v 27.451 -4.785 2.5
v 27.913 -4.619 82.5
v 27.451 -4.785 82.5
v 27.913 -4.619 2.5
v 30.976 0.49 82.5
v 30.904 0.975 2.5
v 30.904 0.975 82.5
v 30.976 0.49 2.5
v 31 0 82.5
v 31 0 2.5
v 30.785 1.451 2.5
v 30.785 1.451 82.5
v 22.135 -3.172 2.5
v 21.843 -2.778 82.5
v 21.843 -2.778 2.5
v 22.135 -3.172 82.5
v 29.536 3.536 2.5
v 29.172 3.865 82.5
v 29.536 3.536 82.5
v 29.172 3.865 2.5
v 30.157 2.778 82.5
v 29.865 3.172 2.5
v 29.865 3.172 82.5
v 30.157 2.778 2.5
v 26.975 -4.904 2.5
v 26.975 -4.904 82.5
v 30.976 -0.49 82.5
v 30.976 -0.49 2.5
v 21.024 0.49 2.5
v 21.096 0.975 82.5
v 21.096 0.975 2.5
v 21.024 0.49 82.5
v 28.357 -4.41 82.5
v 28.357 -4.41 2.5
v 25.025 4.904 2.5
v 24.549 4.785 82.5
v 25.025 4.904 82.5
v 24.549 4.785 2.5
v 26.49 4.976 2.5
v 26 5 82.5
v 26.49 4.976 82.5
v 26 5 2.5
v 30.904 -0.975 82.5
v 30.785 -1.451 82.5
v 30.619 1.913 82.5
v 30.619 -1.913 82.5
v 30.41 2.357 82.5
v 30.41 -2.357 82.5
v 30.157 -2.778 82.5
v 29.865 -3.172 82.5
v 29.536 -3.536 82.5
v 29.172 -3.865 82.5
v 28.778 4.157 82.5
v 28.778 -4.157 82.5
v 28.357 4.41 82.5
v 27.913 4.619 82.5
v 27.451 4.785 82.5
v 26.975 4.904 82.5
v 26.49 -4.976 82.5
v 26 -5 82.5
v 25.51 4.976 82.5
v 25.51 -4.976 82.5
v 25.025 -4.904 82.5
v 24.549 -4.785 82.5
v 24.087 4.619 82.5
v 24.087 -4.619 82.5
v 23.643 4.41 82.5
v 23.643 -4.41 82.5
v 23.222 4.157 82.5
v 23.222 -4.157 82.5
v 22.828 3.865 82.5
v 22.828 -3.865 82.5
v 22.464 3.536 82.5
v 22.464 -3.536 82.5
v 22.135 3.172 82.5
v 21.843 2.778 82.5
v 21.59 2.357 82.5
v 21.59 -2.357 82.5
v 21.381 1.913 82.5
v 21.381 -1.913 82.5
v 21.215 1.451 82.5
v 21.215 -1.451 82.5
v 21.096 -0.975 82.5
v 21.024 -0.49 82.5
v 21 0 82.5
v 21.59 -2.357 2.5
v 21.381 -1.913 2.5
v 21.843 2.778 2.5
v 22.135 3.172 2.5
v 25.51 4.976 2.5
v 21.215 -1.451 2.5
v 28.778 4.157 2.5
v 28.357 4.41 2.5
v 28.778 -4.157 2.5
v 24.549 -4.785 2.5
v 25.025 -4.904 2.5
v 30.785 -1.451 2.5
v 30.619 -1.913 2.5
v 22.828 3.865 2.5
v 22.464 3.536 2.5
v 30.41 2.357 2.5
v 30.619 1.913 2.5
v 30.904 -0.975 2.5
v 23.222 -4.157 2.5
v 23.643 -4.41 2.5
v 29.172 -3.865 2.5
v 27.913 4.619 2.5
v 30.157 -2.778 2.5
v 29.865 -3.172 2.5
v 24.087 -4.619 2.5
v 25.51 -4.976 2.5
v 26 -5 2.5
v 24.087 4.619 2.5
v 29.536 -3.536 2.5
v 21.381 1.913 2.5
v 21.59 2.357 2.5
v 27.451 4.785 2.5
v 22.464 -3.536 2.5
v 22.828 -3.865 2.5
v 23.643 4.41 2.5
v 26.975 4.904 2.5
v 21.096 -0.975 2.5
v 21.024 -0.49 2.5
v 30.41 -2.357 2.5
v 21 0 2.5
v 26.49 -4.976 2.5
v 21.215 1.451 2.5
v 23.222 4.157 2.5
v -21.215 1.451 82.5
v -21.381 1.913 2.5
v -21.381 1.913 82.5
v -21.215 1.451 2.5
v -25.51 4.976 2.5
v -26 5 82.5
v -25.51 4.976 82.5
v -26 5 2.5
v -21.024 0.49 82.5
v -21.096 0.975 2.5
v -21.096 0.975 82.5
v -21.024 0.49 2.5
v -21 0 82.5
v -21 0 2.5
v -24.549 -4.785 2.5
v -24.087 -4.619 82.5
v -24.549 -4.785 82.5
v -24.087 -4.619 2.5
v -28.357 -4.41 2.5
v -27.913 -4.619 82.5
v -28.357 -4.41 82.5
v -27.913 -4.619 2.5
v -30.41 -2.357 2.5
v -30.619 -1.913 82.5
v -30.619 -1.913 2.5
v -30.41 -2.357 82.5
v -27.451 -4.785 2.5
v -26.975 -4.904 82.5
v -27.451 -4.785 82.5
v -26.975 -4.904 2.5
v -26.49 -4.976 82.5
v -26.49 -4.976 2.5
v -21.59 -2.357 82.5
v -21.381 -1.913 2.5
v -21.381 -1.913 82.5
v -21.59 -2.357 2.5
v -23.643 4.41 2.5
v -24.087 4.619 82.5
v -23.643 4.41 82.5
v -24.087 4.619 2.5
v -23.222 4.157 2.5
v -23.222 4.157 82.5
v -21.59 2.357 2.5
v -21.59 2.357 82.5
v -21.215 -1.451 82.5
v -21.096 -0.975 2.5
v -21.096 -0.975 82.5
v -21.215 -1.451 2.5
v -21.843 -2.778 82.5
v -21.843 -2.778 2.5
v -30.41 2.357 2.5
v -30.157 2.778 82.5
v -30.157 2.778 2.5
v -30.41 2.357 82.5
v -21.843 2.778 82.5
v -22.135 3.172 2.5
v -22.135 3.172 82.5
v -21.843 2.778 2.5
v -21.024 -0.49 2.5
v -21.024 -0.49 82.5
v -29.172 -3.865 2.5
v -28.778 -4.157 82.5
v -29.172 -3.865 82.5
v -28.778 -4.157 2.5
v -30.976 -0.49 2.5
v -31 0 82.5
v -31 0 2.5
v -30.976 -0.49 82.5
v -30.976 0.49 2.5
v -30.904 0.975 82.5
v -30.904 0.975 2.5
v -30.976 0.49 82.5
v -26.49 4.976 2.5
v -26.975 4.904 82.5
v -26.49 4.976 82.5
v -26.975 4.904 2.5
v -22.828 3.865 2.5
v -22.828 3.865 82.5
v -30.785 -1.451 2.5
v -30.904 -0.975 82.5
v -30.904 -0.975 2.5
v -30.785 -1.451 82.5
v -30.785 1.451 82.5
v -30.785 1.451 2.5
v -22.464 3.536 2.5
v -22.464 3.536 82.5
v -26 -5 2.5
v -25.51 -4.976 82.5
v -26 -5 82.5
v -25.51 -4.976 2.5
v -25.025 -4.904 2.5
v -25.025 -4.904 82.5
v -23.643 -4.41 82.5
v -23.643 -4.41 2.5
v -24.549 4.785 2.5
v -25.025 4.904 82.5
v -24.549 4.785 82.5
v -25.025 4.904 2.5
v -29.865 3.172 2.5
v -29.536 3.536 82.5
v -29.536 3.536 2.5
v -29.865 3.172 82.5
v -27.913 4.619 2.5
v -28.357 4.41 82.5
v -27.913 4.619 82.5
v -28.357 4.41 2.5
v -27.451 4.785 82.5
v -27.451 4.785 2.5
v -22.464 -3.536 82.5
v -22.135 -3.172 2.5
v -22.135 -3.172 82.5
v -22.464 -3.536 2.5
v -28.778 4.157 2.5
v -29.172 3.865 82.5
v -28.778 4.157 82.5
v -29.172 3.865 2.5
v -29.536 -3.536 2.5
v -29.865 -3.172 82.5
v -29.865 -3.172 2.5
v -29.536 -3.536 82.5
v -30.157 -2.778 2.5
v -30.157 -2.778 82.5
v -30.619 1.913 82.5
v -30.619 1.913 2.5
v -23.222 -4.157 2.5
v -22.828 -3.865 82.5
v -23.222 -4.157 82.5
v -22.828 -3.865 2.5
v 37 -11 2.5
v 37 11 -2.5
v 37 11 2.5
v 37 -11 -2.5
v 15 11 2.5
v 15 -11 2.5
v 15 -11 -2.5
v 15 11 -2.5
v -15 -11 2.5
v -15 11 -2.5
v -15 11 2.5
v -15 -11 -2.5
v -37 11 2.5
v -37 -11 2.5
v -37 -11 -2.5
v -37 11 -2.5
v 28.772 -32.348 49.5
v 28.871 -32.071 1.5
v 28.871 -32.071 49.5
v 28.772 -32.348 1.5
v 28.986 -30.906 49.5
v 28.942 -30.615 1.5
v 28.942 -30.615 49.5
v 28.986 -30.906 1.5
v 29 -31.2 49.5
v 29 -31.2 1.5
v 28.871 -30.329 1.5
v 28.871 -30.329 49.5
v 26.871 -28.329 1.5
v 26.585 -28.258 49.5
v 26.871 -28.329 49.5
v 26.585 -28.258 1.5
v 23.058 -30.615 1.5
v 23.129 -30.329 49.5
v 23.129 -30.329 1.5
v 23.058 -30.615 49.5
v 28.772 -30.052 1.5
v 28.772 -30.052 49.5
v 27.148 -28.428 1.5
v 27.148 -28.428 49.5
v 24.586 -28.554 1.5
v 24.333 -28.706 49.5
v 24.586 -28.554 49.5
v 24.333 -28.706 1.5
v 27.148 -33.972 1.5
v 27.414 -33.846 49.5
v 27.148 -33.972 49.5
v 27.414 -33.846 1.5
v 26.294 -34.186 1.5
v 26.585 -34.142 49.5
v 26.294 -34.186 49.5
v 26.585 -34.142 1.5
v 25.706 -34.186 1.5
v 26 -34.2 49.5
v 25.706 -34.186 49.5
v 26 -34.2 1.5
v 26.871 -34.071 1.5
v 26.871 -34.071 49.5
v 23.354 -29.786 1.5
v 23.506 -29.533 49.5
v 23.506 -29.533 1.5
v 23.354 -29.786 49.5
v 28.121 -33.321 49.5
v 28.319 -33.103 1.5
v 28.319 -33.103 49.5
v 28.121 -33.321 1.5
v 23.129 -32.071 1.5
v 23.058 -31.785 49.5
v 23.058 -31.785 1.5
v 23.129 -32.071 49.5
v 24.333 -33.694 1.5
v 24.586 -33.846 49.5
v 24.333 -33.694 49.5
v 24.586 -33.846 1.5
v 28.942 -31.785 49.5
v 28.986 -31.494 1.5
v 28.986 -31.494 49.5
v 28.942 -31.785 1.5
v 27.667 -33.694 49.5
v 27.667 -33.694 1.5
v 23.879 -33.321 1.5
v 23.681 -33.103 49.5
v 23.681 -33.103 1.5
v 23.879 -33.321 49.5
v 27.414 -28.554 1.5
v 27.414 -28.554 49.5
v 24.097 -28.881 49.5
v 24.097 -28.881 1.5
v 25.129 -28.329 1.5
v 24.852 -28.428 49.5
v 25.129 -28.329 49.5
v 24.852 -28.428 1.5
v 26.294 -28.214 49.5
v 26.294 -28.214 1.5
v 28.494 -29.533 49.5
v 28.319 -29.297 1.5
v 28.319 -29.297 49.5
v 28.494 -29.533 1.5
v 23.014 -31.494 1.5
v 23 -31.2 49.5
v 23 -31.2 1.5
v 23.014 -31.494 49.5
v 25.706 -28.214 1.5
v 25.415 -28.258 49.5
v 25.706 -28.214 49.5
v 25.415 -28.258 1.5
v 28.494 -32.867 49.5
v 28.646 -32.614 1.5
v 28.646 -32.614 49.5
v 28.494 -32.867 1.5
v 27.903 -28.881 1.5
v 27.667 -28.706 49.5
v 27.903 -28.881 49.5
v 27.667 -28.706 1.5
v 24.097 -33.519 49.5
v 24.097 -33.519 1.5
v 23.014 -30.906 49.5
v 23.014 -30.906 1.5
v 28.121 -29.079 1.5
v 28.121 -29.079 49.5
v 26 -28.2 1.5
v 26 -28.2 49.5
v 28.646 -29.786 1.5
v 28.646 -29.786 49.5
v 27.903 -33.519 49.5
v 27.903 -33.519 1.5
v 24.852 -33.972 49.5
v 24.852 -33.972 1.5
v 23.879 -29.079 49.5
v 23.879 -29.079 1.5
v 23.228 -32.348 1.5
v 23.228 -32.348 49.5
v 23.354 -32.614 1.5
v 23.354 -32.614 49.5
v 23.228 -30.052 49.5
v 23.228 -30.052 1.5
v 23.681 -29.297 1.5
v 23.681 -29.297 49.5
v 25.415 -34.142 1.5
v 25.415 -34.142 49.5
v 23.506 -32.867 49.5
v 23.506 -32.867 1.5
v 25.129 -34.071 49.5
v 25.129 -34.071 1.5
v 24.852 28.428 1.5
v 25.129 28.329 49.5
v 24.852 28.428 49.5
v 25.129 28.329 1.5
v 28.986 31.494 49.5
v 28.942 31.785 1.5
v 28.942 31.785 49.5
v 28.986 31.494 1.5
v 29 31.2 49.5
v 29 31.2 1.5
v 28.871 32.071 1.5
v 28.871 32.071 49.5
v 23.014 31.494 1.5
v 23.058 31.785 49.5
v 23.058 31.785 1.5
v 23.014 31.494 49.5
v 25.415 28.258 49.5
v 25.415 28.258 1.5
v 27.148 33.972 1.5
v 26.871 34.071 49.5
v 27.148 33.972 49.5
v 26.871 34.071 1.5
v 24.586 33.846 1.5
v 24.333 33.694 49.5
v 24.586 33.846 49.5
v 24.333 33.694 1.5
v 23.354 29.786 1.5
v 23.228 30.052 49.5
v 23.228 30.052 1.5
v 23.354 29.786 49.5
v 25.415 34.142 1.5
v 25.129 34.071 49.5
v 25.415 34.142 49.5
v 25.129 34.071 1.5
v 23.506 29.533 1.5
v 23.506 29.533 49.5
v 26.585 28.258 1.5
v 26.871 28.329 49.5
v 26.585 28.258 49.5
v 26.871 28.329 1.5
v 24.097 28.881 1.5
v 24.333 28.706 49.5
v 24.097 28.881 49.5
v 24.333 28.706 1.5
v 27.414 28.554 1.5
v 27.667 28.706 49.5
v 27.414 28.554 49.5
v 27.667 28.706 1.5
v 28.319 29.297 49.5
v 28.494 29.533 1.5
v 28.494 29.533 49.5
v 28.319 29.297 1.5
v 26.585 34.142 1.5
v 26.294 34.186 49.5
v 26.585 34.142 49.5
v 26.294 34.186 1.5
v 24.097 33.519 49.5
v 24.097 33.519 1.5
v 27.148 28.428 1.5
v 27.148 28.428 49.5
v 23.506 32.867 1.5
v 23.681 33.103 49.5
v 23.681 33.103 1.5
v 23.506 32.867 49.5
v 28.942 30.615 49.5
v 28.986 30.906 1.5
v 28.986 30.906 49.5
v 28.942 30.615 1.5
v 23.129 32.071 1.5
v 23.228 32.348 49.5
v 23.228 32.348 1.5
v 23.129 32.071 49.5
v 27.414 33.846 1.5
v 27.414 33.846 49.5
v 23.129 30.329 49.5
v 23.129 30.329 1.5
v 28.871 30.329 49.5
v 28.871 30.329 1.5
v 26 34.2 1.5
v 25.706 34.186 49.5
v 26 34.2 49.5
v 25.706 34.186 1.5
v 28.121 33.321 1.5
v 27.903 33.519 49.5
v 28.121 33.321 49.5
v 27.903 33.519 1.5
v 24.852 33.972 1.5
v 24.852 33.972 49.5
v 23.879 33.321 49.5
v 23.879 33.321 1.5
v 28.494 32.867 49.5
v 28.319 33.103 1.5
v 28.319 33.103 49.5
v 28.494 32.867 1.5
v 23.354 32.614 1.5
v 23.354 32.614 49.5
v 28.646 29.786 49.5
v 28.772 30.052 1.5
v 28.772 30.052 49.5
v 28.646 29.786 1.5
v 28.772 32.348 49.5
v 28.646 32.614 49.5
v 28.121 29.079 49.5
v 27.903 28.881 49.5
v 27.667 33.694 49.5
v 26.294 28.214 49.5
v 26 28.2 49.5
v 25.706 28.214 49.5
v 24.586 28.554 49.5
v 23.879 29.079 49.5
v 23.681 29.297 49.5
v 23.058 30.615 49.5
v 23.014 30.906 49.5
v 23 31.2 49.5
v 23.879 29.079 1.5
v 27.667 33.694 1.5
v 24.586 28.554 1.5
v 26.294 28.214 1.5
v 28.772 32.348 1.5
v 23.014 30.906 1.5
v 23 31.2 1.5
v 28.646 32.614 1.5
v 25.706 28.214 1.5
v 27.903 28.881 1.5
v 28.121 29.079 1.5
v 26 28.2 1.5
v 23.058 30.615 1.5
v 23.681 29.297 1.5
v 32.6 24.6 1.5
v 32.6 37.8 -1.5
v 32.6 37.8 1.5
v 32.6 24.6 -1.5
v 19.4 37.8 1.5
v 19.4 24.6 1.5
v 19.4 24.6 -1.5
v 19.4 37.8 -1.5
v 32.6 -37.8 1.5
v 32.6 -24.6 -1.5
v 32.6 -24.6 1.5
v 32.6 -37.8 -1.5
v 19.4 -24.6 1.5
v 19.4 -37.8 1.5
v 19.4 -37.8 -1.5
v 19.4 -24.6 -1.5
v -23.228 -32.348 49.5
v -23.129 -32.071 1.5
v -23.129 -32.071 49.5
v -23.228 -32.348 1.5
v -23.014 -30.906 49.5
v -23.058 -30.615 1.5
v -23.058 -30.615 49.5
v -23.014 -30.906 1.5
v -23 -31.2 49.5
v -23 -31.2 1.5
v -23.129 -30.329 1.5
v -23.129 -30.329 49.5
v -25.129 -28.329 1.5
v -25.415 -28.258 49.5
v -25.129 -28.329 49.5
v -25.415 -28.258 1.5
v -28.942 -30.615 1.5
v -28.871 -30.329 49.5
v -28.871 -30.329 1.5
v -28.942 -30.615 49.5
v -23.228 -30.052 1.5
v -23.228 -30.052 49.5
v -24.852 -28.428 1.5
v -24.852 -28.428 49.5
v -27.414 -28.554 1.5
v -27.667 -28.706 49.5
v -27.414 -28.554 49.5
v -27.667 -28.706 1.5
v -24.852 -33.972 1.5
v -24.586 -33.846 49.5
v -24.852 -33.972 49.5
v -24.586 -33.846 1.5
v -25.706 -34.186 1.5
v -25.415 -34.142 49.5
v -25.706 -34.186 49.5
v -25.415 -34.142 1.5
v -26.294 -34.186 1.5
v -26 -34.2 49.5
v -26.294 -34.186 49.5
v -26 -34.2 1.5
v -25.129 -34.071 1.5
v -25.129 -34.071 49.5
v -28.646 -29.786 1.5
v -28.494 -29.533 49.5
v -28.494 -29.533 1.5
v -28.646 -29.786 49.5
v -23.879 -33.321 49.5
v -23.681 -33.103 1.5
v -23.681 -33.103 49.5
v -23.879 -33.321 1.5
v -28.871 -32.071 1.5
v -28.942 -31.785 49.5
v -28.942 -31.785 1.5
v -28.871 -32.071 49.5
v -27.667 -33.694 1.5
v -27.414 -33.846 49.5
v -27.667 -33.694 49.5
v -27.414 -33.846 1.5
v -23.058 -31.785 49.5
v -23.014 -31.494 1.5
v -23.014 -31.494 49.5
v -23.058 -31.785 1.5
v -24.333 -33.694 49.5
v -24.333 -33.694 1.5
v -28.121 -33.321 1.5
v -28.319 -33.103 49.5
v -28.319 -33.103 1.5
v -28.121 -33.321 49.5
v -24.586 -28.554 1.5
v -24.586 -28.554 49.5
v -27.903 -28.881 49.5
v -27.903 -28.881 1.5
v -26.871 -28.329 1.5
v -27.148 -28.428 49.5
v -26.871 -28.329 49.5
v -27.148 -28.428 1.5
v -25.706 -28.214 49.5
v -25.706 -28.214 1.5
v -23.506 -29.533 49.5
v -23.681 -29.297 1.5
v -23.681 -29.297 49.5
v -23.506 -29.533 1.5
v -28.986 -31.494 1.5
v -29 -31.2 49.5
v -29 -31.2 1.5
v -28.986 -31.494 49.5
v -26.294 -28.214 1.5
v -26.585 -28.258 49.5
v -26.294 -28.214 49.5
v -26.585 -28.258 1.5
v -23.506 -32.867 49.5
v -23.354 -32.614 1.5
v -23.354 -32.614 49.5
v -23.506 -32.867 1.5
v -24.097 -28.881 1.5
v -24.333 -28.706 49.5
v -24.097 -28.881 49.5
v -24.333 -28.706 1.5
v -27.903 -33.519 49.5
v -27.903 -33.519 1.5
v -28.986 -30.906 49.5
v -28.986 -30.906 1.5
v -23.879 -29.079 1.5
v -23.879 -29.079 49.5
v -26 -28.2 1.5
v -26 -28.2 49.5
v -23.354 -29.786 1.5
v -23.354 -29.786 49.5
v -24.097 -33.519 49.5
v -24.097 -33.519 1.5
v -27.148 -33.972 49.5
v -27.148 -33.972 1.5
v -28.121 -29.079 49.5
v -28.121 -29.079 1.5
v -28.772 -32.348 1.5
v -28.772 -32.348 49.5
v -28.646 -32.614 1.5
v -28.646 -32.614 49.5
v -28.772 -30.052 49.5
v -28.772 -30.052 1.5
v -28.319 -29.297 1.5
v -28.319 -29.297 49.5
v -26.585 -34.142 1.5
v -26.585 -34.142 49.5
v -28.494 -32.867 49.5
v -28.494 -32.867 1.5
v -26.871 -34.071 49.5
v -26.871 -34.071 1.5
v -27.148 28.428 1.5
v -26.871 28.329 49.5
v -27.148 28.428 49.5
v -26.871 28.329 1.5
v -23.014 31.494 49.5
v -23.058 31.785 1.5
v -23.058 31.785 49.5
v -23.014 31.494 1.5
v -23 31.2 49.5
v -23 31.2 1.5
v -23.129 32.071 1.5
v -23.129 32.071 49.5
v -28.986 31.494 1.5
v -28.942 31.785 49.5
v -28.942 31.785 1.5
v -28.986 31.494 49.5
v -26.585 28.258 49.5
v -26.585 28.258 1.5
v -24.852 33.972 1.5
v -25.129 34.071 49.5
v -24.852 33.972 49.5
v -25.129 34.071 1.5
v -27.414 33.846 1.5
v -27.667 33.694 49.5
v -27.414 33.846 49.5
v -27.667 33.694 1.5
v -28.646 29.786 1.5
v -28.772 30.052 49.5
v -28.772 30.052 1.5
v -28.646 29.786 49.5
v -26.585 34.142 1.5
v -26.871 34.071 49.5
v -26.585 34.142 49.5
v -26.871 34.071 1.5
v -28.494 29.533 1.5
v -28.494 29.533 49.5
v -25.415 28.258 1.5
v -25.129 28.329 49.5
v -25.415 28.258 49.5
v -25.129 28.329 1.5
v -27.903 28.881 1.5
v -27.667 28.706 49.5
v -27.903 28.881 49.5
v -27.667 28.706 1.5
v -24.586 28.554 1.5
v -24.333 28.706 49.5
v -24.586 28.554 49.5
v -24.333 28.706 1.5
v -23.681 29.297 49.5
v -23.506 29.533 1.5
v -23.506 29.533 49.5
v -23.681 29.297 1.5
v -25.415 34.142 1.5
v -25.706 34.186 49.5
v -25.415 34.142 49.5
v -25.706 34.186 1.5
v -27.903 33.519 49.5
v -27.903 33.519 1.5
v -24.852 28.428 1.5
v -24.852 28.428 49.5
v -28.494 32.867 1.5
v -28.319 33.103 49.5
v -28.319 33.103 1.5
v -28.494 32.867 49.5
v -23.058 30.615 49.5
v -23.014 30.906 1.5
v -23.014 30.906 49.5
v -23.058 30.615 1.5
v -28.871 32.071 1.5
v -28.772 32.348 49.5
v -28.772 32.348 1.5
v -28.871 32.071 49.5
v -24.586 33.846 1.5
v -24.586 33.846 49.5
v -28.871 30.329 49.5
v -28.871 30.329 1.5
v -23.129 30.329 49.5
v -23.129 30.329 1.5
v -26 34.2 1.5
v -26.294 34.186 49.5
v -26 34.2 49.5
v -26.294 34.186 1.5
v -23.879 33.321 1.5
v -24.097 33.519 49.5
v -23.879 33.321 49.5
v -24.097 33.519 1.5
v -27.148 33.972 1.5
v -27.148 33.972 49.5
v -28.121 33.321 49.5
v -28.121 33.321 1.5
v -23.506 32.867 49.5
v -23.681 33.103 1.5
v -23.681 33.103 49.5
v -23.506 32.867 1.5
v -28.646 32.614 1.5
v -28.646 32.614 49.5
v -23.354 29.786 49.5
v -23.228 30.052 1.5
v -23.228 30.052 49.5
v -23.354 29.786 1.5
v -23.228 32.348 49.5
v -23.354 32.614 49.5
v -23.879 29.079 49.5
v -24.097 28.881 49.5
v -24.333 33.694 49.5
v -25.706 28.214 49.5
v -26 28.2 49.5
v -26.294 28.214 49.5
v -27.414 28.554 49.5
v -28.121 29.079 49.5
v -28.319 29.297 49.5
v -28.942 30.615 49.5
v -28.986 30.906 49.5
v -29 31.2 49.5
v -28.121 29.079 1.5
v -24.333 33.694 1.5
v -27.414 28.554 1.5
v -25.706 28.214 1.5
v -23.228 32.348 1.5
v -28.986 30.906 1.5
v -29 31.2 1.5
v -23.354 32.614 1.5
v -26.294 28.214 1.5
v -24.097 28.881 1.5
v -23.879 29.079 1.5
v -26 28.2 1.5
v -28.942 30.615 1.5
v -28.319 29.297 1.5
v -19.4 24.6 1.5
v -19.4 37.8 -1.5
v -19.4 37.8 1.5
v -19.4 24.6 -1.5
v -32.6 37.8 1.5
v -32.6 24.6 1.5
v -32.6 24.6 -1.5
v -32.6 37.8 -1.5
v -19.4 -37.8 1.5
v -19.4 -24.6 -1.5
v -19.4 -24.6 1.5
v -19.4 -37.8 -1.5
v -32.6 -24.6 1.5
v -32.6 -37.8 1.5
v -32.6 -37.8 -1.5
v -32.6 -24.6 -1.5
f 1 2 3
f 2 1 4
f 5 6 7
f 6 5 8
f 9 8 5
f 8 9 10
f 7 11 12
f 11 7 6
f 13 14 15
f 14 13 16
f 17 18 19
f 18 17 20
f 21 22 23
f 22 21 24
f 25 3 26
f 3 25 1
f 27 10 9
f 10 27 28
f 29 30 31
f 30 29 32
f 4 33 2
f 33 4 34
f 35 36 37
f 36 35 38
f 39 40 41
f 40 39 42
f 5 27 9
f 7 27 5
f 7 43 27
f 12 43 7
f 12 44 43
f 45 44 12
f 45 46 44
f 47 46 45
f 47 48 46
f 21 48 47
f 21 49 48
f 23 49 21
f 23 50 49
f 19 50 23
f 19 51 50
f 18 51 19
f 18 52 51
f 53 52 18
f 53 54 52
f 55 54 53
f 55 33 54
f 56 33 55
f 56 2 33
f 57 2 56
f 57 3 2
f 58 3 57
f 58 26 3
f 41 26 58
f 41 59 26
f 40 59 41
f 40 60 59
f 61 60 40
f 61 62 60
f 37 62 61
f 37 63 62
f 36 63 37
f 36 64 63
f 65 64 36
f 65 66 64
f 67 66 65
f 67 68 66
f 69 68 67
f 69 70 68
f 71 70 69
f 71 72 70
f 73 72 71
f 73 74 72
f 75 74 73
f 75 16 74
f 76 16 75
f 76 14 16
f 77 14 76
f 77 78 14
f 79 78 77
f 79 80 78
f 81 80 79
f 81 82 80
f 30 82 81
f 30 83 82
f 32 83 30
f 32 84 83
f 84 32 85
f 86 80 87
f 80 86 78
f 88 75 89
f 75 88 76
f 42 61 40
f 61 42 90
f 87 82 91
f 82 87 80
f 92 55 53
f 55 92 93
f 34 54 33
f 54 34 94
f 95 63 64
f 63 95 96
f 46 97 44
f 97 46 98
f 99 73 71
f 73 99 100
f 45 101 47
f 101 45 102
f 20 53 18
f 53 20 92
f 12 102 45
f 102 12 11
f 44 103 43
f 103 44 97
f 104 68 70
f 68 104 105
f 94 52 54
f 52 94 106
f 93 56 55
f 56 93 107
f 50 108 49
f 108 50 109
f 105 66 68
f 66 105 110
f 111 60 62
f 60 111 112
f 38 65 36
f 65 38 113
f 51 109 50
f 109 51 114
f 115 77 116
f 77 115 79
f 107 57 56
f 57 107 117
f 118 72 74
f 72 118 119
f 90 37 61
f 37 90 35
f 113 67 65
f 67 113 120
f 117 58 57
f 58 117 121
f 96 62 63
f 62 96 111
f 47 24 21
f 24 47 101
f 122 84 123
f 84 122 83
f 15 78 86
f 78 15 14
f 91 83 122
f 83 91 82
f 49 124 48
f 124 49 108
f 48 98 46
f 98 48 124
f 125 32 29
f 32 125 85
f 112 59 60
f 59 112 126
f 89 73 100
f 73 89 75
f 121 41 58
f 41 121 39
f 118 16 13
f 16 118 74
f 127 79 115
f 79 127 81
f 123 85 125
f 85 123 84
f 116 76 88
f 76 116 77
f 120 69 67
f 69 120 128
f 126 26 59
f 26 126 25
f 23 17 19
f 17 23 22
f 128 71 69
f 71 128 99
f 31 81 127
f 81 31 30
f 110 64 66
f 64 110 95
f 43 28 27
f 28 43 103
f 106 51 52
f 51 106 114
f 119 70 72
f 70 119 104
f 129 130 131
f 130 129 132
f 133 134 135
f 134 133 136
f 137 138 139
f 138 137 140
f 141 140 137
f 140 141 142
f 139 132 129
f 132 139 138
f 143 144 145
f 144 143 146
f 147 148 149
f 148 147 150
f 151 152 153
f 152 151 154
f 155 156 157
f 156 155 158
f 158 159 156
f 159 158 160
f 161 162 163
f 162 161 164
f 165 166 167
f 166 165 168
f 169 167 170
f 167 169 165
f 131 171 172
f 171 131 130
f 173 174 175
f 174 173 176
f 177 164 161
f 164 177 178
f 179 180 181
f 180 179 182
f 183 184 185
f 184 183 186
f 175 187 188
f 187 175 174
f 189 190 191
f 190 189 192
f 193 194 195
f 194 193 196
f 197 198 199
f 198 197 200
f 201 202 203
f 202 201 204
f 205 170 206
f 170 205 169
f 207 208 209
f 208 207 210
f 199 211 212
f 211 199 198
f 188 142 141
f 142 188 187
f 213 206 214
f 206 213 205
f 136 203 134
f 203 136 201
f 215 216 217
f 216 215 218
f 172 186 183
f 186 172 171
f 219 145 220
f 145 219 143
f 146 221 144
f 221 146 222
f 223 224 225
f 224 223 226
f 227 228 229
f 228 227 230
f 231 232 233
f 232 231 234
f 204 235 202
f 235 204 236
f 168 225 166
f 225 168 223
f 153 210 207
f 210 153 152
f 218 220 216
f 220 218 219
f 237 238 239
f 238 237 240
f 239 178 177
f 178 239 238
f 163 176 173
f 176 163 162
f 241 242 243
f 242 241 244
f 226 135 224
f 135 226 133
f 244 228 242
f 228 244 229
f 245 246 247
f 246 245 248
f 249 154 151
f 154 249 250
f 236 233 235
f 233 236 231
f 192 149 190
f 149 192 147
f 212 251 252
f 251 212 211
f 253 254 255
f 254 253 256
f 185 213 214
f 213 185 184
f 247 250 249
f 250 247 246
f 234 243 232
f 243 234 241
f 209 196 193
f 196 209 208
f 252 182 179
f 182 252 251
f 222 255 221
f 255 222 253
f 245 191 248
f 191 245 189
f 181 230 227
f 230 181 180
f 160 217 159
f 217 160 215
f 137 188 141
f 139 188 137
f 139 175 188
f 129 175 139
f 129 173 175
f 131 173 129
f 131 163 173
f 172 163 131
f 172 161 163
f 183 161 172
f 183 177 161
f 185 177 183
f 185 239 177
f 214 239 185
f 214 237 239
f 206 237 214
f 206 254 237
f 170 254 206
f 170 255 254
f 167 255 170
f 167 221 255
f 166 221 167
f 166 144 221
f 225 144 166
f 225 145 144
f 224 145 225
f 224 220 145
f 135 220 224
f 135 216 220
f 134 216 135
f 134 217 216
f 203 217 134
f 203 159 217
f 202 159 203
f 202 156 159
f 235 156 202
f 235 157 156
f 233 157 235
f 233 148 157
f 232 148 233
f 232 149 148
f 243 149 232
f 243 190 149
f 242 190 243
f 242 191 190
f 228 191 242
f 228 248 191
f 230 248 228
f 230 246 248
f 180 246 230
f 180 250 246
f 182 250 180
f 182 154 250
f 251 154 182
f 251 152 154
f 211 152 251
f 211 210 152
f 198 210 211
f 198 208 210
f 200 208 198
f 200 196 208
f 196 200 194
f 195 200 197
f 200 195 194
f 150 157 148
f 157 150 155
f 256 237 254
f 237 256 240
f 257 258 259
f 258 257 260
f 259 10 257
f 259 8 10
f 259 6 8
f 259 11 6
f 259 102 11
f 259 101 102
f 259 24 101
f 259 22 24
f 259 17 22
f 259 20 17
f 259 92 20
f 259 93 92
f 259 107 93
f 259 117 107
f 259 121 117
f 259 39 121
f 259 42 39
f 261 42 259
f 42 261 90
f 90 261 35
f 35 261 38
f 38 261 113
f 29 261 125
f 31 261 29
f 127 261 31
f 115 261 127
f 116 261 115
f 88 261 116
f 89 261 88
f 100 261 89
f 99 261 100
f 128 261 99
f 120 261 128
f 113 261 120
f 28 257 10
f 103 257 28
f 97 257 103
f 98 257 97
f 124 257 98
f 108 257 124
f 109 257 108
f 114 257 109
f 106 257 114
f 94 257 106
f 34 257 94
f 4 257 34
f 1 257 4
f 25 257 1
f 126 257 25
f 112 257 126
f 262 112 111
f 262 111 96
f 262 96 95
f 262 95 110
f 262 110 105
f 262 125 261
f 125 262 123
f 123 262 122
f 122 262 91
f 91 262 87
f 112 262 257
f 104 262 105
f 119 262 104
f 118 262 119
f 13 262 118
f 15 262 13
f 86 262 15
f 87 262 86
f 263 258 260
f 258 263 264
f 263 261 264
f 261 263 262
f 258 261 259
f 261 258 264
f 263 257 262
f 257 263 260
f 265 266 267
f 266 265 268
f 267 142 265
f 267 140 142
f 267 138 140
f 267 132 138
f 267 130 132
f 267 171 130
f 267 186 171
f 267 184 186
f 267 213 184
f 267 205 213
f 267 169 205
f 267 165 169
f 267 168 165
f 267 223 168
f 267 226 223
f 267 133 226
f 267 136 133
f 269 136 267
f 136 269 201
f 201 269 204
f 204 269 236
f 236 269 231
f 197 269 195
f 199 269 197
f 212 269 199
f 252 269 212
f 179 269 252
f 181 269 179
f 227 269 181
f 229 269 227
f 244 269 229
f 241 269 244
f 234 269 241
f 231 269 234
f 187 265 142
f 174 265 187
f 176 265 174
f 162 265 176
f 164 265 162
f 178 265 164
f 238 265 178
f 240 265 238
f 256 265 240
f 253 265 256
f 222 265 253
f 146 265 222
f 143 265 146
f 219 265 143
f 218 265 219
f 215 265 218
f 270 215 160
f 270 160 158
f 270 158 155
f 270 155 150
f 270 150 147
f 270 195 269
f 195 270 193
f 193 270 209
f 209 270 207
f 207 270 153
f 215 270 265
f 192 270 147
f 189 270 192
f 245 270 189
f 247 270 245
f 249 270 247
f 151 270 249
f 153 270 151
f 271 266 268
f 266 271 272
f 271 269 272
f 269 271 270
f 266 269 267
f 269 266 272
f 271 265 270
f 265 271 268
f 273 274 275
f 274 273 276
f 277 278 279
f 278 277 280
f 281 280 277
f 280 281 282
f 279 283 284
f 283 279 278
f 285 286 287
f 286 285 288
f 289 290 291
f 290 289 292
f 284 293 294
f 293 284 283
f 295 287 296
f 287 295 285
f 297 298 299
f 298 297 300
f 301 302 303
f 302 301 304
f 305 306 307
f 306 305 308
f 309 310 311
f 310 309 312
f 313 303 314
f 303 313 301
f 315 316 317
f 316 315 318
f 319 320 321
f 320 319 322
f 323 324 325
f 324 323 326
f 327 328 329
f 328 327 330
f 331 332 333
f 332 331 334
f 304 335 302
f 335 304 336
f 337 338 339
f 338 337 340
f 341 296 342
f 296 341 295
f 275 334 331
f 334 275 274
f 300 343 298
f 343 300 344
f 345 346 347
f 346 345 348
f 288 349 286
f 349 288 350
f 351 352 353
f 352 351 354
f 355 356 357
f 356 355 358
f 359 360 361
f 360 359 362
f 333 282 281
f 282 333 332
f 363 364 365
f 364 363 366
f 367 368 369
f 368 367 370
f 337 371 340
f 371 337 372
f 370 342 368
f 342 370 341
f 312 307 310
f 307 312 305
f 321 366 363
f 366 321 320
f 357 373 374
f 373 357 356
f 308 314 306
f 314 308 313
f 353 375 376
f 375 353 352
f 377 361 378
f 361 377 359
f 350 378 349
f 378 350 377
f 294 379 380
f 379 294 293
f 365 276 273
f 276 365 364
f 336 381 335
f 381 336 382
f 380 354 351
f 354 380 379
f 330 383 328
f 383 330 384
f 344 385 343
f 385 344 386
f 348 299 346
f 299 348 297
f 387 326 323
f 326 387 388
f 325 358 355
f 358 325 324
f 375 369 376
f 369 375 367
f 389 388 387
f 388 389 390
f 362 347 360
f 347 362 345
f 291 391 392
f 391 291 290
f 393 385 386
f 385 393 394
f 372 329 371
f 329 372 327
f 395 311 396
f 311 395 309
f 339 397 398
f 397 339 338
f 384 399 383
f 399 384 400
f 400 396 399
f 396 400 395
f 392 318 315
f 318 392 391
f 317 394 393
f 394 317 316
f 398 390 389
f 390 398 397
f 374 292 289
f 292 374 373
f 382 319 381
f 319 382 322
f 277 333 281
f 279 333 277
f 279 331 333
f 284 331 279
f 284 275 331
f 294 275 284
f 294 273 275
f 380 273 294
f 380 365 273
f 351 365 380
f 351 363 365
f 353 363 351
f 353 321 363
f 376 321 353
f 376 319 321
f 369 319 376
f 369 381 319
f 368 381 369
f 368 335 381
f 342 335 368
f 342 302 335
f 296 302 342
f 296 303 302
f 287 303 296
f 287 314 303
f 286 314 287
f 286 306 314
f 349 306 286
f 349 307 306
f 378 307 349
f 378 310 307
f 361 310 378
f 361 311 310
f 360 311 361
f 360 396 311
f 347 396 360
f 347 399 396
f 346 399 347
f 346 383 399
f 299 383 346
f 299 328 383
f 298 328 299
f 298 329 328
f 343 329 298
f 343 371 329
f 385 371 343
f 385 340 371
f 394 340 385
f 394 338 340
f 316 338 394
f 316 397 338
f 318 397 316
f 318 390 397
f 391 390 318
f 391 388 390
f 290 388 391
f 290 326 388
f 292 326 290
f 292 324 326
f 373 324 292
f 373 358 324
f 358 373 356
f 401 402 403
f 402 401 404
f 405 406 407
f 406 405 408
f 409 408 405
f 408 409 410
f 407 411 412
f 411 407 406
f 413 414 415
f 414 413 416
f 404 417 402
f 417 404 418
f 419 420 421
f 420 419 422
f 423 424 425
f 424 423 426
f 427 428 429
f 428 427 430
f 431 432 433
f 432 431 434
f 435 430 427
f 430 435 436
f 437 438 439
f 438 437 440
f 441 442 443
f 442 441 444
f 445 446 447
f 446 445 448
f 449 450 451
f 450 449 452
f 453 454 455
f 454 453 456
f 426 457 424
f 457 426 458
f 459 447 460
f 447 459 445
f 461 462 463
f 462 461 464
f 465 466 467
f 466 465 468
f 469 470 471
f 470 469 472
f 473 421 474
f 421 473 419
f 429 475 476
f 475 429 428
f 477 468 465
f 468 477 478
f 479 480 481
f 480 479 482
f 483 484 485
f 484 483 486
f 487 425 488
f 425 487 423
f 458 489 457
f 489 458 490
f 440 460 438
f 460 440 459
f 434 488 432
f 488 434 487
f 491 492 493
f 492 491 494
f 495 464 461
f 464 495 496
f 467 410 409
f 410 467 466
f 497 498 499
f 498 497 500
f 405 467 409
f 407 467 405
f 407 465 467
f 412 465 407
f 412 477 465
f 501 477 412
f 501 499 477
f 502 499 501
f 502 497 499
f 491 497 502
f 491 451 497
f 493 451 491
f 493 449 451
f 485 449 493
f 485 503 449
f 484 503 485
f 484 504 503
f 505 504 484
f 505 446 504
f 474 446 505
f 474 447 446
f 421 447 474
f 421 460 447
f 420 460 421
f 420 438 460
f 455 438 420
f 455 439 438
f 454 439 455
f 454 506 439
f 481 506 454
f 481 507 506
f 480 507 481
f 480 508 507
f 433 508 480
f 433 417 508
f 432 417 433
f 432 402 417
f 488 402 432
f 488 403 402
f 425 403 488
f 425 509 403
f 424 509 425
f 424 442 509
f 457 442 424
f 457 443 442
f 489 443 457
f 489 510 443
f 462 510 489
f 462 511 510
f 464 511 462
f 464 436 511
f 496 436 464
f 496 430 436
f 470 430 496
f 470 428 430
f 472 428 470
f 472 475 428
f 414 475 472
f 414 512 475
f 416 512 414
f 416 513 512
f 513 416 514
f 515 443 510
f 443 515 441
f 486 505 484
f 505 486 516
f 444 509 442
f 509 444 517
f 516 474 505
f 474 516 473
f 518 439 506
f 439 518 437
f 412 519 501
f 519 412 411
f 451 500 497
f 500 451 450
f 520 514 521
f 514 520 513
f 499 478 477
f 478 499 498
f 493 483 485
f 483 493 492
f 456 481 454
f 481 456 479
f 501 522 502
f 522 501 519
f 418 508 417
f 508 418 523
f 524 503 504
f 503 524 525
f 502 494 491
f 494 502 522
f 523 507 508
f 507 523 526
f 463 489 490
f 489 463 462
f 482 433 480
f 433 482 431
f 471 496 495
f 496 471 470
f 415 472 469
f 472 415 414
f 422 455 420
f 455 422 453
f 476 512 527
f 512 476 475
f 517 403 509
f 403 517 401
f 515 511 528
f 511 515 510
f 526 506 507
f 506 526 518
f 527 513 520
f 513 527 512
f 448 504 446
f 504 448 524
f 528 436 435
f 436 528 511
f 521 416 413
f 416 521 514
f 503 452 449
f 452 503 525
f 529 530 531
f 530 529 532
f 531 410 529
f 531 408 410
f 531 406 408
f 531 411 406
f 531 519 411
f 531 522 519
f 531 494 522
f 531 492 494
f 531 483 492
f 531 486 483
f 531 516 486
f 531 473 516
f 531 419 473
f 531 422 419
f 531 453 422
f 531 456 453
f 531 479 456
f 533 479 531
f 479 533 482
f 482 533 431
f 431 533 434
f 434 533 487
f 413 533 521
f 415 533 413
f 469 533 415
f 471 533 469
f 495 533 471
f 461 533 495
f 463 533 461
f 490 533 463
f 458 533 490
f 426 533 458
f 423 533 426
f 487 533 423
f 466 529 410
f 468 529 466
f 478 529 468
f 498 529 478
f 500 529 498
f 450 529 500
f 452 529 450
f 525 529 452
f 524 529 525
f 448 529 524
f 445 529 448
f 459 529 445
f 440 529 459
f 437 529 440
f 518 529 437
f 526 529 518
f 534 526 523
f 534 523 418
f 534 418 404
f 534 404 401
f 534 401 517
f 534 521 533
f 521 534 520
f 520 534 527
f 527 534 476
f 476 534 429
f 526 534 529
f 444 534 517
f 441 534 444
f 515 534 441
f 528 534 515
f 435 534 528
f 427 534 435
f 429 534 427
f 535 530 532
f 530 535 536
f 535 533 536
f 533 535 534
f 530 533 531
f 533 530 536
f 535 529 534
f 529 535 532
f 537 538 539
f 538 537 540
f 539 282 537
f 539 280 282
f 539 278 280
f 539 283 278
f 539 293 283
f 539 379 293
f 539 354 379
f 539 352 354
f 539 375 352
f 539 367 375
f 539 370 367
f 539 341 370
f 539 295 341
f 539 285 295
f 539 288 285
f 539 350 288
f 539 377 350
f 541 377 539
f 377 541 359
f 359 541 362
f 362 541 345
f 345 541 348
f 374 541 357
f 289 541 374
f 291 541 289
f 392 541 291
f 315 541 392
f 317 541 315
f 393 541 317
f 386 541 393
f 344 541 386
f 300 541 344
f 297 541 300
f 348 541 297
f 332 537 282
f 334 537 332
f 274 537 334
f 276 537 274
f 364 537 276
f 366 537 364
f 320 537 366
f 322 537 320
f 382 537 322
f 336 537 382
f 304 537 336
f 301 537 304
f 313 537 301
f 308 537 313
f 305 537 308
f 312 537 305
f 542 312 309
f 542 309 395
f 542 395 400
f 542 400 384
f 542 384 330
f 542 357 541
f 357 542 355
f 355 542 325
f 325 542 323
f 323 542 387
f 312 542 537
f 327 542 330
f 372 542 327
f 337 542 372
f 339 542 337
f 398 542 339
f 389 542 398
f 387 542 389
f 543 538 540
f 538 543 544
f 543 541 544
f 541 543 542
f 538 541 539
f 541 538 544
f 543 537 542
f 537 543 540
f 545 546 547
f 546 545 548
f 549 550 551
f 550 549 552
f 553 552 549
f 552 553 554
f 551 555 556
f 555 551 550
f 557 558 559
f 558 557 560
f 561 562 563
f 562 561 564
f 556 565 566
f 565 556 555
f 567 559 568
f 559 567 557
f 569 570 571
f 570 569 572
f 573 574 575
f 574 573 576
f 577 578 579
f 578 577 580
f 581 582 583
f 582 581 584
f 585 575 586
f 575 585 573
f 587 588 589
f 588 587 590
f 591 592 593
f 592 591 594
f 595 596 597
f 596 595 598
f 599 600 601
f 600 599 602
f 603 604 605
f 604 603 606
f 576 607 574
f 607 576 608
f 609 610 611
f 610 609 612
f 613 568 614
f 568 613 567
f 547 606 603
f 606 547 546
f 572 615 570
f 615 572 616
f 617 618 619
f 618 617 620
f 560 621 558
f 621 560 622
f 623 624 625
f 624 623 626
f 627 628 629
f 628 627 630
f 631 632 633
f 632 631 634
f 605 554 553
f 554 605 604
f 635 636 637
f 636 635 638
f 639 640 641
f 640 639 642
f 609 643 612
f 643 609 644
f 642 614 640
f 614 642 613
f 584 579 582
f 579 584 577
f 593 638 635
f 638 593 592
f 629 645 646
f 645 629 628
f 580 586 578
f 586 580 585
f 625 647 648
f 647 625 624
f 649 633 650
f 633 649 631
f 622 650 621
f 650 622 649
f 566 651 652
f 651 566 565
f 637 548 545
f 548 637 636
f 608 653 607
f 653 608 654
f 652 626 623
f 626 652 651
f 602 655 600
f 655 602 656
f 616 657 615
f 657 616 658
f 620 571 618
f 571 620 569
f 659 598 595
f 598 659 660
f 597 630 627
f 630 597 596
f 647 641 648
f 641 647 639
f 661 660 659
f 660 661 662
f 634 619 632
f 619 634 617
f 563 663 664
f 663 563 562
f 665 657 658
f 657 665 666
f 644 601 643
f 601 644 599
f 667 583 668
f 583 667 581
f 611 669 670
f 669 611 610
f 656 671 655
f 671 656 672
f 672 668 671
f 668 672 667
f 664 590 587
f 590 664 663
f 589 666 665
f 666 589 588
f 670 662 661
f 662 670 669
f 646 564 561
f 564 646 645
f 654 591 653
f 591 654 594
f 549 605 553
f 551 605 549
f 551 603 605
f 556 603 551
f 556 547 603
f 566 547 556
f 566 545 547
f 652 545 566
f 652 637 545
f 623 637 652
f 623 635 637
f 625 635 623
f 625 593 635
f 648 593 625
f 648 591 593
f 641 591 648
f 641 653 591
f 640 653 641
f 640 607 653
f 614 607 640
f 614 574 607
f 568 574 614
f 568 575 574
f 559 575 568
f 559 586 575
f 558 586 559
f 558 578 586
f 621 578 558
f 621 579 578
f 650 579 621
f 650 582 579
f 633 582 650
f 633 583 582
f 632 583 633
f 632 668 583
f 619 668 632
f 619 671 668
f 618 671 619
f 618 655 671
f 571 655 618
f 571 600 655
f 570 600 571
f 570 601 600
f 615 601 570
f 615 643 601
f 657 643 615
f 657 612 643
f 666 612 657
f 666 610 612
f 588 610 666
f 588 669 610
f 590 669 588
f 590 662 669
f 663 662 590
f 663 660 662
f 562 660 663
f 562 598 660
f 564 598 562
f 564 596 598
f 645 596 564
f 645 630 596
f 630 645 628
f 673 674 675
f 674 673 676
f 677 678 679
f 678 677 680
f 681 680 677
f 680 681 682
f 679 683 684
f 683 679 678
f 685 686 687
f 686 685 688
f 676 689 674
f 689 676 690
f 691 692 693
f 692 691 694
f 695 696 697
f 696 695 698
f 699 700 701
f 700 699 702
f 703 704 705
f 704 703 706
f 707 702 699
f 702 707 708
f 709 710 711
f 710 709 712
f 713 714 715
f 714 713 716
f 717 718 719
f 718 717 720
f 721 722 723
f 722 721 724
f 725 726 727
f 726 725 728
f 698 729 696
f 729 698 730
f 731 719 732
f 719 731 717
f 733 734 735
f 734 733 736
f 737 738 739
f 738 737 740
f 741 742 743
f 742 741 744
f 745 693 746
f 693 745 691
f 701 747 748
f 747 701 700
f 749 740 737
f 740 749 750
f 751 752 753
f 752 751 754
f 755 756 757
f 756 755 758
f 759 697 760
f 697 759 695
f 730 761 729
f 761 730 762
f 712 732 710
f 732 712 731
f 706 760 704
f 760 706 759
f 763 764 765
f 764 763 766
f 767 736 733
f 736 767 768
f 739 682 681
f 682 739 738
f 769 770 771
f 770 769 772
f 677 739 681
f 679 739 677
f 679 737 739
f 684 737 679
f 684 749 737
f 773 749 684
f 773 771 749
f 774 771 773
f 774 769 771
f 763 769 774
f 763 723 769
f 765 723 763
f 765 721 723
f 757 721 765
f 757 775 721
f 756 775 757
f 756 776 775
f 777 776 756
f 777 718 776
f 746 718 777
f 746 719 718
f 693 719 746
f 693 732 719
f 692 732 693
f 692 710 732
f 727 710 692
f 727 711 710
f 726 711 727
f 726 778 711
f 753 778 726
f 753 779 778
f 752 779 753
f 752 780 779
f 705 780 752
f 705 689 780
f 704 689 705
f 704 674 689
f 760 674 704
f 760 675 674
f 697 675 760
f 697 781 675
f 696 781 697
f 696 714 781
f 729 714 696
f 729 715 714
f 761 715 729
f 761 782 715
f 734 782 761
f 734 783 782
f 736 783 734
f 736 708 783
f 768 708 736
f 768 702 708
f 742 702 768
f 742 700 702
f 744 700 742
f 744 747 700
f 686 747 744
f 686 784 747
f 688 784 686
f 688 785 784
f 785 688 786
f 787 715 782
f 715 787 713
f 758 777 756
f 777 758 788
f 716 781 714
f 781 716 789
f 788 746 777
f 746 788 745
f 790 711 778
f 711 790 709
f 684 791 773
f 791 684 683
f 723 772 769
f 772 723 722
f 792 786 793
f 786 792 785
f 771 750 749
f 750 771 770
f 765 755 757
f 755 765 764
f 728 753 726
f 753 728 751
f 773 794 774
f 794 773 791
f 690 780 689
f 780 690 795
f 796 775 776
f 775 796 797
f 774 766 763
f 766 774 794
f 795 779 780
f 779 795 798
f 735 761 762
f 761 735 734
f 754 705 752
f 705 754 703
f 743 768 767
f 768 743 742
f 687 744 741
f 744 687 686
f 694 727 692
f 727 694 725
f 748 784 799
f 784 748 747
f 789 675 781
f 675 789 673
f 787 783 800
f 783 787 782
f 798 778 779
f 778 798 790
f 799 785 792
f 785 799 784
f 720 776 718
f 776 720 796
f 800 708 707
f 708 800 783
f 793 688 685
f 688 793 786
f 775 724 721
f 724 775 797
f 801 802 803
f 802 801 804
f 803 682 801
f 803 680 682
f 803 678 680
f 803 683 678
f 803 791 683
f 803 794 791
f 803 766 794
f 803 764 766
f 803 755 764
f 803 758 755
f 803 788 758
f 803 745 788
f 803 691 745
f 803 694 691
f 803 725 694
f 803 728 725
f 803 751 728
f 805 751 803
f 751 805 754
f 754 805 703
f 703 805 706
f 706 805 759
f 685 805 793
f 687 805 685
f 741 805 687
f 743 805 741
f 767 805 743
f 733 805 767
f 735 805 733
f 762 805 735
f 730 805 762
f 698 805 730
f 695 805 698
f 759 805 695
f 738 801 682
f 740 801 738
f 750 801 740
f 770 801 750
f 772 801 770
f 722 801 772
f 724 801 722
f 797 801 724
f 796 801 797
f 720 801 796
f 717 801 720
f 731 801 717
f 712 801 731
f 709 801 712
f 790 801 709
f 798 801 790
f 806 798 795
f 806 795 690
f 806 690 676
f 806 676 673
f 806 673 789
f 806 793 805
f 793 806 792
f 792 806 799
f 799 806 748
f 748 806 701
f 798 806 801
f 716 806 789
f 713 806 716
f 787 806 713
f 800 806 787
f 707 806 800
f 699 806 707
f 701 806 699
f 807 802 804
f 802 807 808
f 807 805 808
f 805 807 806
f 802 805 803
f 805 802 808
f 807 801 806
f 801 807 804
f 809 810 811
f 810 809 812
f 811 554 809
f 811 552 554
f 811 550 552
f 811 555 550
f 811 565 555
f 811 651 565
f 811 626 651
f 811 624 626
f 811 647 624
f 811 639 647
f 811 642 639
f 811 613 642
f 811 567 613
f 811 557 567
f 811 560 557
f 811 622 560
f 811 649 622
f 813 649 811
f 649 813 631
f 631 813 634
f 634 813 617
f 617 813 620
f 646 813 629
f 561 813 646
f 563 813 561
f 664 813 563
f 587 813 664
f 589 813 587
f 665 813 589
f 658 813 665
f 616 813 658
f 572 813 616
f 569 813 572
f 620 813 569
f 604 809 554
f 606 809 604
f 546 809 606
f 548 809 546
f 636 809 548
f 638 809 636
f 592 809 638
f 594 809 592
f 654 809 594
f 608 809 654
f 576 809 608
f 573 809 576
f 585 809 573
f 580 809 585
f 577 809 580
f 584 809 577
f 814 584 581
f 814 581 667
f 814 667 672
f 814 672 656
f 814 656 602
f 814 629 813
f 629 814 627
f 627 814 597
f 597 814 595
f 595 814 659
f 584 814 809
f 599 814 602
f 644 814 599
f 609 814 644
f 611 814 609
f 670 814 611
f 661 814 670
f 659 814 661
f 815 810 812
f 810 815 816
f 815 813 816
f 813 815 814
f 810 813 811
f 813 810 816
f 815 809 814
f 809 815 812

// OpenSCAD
$fn = 64;


riser_height = 110;
riser_width = 80;


column_dia = 10;
small_col_dia = 5;



// --- Derived Dimensions & Colors ---
torii_red = [0.8, 0.1, 0.1];
stone_grey = [0.3, 0.3, 0.35];
roof_black = [0.15, 0.15, 0.15];


// scaling
column_spacing = riser_width * 0.65;
column_height = riser_height * 0.75;
column_angle = 0;

torii_assemble();

module base_stone(r) {
    color(stone_grey)
    cube([r*2.2, r*2.2, r*0.5], center=true);
}

module main_pillars() {
    translate([column_spacing/2, 0, 0]) base_stone(column_dia);
    translate([-column_spacing/2, 0, 0]) base_stone(column_dia);
    
    color(torii_red) {
        
        translate([column_spacing/2, 0, 0])
        rotate([0, -column_angle, 0])
        cylinder(h=column_height, d=column_dia);
        translate([-column_spacing/2, 0, 0])
        rotate([0, column_angle, 0])
        cylinder(h=column_height, d=column_dia);
    }
}

module support_pillars() {
    support_height = column_height * 0.6;
    support_dia = column_dia * 0.6;
    support_spacing = column_spacing * 0.6;
    
    module single_support() {
        translate([0, support_spacing, 0])
        base_stone(support_dia);
        translate([0, -support_spacing, 0])
        base_stone(support_dia);
        
        color(torii_red) {
            
        translate([0, -support_spacing, 0])
            rotate([0, -0, 0])
            cylinder(h=support_height, d=support_dia);
        translate([0, support_spacing, 0])
            rotate([0, 0, 0])
            cylinder(h=support_height, d=support_dia);
        }
        
    }
    translate([column_spacing/2, 0, 0]) single_support();
    translate([-column_spacing/2, 0, 0]) single_support();
}


/*

module top_roof() {
}

*/



// --- Assembling structure ---

module torii_assemble() {
    main_pillars();
    support_pillars();
}
